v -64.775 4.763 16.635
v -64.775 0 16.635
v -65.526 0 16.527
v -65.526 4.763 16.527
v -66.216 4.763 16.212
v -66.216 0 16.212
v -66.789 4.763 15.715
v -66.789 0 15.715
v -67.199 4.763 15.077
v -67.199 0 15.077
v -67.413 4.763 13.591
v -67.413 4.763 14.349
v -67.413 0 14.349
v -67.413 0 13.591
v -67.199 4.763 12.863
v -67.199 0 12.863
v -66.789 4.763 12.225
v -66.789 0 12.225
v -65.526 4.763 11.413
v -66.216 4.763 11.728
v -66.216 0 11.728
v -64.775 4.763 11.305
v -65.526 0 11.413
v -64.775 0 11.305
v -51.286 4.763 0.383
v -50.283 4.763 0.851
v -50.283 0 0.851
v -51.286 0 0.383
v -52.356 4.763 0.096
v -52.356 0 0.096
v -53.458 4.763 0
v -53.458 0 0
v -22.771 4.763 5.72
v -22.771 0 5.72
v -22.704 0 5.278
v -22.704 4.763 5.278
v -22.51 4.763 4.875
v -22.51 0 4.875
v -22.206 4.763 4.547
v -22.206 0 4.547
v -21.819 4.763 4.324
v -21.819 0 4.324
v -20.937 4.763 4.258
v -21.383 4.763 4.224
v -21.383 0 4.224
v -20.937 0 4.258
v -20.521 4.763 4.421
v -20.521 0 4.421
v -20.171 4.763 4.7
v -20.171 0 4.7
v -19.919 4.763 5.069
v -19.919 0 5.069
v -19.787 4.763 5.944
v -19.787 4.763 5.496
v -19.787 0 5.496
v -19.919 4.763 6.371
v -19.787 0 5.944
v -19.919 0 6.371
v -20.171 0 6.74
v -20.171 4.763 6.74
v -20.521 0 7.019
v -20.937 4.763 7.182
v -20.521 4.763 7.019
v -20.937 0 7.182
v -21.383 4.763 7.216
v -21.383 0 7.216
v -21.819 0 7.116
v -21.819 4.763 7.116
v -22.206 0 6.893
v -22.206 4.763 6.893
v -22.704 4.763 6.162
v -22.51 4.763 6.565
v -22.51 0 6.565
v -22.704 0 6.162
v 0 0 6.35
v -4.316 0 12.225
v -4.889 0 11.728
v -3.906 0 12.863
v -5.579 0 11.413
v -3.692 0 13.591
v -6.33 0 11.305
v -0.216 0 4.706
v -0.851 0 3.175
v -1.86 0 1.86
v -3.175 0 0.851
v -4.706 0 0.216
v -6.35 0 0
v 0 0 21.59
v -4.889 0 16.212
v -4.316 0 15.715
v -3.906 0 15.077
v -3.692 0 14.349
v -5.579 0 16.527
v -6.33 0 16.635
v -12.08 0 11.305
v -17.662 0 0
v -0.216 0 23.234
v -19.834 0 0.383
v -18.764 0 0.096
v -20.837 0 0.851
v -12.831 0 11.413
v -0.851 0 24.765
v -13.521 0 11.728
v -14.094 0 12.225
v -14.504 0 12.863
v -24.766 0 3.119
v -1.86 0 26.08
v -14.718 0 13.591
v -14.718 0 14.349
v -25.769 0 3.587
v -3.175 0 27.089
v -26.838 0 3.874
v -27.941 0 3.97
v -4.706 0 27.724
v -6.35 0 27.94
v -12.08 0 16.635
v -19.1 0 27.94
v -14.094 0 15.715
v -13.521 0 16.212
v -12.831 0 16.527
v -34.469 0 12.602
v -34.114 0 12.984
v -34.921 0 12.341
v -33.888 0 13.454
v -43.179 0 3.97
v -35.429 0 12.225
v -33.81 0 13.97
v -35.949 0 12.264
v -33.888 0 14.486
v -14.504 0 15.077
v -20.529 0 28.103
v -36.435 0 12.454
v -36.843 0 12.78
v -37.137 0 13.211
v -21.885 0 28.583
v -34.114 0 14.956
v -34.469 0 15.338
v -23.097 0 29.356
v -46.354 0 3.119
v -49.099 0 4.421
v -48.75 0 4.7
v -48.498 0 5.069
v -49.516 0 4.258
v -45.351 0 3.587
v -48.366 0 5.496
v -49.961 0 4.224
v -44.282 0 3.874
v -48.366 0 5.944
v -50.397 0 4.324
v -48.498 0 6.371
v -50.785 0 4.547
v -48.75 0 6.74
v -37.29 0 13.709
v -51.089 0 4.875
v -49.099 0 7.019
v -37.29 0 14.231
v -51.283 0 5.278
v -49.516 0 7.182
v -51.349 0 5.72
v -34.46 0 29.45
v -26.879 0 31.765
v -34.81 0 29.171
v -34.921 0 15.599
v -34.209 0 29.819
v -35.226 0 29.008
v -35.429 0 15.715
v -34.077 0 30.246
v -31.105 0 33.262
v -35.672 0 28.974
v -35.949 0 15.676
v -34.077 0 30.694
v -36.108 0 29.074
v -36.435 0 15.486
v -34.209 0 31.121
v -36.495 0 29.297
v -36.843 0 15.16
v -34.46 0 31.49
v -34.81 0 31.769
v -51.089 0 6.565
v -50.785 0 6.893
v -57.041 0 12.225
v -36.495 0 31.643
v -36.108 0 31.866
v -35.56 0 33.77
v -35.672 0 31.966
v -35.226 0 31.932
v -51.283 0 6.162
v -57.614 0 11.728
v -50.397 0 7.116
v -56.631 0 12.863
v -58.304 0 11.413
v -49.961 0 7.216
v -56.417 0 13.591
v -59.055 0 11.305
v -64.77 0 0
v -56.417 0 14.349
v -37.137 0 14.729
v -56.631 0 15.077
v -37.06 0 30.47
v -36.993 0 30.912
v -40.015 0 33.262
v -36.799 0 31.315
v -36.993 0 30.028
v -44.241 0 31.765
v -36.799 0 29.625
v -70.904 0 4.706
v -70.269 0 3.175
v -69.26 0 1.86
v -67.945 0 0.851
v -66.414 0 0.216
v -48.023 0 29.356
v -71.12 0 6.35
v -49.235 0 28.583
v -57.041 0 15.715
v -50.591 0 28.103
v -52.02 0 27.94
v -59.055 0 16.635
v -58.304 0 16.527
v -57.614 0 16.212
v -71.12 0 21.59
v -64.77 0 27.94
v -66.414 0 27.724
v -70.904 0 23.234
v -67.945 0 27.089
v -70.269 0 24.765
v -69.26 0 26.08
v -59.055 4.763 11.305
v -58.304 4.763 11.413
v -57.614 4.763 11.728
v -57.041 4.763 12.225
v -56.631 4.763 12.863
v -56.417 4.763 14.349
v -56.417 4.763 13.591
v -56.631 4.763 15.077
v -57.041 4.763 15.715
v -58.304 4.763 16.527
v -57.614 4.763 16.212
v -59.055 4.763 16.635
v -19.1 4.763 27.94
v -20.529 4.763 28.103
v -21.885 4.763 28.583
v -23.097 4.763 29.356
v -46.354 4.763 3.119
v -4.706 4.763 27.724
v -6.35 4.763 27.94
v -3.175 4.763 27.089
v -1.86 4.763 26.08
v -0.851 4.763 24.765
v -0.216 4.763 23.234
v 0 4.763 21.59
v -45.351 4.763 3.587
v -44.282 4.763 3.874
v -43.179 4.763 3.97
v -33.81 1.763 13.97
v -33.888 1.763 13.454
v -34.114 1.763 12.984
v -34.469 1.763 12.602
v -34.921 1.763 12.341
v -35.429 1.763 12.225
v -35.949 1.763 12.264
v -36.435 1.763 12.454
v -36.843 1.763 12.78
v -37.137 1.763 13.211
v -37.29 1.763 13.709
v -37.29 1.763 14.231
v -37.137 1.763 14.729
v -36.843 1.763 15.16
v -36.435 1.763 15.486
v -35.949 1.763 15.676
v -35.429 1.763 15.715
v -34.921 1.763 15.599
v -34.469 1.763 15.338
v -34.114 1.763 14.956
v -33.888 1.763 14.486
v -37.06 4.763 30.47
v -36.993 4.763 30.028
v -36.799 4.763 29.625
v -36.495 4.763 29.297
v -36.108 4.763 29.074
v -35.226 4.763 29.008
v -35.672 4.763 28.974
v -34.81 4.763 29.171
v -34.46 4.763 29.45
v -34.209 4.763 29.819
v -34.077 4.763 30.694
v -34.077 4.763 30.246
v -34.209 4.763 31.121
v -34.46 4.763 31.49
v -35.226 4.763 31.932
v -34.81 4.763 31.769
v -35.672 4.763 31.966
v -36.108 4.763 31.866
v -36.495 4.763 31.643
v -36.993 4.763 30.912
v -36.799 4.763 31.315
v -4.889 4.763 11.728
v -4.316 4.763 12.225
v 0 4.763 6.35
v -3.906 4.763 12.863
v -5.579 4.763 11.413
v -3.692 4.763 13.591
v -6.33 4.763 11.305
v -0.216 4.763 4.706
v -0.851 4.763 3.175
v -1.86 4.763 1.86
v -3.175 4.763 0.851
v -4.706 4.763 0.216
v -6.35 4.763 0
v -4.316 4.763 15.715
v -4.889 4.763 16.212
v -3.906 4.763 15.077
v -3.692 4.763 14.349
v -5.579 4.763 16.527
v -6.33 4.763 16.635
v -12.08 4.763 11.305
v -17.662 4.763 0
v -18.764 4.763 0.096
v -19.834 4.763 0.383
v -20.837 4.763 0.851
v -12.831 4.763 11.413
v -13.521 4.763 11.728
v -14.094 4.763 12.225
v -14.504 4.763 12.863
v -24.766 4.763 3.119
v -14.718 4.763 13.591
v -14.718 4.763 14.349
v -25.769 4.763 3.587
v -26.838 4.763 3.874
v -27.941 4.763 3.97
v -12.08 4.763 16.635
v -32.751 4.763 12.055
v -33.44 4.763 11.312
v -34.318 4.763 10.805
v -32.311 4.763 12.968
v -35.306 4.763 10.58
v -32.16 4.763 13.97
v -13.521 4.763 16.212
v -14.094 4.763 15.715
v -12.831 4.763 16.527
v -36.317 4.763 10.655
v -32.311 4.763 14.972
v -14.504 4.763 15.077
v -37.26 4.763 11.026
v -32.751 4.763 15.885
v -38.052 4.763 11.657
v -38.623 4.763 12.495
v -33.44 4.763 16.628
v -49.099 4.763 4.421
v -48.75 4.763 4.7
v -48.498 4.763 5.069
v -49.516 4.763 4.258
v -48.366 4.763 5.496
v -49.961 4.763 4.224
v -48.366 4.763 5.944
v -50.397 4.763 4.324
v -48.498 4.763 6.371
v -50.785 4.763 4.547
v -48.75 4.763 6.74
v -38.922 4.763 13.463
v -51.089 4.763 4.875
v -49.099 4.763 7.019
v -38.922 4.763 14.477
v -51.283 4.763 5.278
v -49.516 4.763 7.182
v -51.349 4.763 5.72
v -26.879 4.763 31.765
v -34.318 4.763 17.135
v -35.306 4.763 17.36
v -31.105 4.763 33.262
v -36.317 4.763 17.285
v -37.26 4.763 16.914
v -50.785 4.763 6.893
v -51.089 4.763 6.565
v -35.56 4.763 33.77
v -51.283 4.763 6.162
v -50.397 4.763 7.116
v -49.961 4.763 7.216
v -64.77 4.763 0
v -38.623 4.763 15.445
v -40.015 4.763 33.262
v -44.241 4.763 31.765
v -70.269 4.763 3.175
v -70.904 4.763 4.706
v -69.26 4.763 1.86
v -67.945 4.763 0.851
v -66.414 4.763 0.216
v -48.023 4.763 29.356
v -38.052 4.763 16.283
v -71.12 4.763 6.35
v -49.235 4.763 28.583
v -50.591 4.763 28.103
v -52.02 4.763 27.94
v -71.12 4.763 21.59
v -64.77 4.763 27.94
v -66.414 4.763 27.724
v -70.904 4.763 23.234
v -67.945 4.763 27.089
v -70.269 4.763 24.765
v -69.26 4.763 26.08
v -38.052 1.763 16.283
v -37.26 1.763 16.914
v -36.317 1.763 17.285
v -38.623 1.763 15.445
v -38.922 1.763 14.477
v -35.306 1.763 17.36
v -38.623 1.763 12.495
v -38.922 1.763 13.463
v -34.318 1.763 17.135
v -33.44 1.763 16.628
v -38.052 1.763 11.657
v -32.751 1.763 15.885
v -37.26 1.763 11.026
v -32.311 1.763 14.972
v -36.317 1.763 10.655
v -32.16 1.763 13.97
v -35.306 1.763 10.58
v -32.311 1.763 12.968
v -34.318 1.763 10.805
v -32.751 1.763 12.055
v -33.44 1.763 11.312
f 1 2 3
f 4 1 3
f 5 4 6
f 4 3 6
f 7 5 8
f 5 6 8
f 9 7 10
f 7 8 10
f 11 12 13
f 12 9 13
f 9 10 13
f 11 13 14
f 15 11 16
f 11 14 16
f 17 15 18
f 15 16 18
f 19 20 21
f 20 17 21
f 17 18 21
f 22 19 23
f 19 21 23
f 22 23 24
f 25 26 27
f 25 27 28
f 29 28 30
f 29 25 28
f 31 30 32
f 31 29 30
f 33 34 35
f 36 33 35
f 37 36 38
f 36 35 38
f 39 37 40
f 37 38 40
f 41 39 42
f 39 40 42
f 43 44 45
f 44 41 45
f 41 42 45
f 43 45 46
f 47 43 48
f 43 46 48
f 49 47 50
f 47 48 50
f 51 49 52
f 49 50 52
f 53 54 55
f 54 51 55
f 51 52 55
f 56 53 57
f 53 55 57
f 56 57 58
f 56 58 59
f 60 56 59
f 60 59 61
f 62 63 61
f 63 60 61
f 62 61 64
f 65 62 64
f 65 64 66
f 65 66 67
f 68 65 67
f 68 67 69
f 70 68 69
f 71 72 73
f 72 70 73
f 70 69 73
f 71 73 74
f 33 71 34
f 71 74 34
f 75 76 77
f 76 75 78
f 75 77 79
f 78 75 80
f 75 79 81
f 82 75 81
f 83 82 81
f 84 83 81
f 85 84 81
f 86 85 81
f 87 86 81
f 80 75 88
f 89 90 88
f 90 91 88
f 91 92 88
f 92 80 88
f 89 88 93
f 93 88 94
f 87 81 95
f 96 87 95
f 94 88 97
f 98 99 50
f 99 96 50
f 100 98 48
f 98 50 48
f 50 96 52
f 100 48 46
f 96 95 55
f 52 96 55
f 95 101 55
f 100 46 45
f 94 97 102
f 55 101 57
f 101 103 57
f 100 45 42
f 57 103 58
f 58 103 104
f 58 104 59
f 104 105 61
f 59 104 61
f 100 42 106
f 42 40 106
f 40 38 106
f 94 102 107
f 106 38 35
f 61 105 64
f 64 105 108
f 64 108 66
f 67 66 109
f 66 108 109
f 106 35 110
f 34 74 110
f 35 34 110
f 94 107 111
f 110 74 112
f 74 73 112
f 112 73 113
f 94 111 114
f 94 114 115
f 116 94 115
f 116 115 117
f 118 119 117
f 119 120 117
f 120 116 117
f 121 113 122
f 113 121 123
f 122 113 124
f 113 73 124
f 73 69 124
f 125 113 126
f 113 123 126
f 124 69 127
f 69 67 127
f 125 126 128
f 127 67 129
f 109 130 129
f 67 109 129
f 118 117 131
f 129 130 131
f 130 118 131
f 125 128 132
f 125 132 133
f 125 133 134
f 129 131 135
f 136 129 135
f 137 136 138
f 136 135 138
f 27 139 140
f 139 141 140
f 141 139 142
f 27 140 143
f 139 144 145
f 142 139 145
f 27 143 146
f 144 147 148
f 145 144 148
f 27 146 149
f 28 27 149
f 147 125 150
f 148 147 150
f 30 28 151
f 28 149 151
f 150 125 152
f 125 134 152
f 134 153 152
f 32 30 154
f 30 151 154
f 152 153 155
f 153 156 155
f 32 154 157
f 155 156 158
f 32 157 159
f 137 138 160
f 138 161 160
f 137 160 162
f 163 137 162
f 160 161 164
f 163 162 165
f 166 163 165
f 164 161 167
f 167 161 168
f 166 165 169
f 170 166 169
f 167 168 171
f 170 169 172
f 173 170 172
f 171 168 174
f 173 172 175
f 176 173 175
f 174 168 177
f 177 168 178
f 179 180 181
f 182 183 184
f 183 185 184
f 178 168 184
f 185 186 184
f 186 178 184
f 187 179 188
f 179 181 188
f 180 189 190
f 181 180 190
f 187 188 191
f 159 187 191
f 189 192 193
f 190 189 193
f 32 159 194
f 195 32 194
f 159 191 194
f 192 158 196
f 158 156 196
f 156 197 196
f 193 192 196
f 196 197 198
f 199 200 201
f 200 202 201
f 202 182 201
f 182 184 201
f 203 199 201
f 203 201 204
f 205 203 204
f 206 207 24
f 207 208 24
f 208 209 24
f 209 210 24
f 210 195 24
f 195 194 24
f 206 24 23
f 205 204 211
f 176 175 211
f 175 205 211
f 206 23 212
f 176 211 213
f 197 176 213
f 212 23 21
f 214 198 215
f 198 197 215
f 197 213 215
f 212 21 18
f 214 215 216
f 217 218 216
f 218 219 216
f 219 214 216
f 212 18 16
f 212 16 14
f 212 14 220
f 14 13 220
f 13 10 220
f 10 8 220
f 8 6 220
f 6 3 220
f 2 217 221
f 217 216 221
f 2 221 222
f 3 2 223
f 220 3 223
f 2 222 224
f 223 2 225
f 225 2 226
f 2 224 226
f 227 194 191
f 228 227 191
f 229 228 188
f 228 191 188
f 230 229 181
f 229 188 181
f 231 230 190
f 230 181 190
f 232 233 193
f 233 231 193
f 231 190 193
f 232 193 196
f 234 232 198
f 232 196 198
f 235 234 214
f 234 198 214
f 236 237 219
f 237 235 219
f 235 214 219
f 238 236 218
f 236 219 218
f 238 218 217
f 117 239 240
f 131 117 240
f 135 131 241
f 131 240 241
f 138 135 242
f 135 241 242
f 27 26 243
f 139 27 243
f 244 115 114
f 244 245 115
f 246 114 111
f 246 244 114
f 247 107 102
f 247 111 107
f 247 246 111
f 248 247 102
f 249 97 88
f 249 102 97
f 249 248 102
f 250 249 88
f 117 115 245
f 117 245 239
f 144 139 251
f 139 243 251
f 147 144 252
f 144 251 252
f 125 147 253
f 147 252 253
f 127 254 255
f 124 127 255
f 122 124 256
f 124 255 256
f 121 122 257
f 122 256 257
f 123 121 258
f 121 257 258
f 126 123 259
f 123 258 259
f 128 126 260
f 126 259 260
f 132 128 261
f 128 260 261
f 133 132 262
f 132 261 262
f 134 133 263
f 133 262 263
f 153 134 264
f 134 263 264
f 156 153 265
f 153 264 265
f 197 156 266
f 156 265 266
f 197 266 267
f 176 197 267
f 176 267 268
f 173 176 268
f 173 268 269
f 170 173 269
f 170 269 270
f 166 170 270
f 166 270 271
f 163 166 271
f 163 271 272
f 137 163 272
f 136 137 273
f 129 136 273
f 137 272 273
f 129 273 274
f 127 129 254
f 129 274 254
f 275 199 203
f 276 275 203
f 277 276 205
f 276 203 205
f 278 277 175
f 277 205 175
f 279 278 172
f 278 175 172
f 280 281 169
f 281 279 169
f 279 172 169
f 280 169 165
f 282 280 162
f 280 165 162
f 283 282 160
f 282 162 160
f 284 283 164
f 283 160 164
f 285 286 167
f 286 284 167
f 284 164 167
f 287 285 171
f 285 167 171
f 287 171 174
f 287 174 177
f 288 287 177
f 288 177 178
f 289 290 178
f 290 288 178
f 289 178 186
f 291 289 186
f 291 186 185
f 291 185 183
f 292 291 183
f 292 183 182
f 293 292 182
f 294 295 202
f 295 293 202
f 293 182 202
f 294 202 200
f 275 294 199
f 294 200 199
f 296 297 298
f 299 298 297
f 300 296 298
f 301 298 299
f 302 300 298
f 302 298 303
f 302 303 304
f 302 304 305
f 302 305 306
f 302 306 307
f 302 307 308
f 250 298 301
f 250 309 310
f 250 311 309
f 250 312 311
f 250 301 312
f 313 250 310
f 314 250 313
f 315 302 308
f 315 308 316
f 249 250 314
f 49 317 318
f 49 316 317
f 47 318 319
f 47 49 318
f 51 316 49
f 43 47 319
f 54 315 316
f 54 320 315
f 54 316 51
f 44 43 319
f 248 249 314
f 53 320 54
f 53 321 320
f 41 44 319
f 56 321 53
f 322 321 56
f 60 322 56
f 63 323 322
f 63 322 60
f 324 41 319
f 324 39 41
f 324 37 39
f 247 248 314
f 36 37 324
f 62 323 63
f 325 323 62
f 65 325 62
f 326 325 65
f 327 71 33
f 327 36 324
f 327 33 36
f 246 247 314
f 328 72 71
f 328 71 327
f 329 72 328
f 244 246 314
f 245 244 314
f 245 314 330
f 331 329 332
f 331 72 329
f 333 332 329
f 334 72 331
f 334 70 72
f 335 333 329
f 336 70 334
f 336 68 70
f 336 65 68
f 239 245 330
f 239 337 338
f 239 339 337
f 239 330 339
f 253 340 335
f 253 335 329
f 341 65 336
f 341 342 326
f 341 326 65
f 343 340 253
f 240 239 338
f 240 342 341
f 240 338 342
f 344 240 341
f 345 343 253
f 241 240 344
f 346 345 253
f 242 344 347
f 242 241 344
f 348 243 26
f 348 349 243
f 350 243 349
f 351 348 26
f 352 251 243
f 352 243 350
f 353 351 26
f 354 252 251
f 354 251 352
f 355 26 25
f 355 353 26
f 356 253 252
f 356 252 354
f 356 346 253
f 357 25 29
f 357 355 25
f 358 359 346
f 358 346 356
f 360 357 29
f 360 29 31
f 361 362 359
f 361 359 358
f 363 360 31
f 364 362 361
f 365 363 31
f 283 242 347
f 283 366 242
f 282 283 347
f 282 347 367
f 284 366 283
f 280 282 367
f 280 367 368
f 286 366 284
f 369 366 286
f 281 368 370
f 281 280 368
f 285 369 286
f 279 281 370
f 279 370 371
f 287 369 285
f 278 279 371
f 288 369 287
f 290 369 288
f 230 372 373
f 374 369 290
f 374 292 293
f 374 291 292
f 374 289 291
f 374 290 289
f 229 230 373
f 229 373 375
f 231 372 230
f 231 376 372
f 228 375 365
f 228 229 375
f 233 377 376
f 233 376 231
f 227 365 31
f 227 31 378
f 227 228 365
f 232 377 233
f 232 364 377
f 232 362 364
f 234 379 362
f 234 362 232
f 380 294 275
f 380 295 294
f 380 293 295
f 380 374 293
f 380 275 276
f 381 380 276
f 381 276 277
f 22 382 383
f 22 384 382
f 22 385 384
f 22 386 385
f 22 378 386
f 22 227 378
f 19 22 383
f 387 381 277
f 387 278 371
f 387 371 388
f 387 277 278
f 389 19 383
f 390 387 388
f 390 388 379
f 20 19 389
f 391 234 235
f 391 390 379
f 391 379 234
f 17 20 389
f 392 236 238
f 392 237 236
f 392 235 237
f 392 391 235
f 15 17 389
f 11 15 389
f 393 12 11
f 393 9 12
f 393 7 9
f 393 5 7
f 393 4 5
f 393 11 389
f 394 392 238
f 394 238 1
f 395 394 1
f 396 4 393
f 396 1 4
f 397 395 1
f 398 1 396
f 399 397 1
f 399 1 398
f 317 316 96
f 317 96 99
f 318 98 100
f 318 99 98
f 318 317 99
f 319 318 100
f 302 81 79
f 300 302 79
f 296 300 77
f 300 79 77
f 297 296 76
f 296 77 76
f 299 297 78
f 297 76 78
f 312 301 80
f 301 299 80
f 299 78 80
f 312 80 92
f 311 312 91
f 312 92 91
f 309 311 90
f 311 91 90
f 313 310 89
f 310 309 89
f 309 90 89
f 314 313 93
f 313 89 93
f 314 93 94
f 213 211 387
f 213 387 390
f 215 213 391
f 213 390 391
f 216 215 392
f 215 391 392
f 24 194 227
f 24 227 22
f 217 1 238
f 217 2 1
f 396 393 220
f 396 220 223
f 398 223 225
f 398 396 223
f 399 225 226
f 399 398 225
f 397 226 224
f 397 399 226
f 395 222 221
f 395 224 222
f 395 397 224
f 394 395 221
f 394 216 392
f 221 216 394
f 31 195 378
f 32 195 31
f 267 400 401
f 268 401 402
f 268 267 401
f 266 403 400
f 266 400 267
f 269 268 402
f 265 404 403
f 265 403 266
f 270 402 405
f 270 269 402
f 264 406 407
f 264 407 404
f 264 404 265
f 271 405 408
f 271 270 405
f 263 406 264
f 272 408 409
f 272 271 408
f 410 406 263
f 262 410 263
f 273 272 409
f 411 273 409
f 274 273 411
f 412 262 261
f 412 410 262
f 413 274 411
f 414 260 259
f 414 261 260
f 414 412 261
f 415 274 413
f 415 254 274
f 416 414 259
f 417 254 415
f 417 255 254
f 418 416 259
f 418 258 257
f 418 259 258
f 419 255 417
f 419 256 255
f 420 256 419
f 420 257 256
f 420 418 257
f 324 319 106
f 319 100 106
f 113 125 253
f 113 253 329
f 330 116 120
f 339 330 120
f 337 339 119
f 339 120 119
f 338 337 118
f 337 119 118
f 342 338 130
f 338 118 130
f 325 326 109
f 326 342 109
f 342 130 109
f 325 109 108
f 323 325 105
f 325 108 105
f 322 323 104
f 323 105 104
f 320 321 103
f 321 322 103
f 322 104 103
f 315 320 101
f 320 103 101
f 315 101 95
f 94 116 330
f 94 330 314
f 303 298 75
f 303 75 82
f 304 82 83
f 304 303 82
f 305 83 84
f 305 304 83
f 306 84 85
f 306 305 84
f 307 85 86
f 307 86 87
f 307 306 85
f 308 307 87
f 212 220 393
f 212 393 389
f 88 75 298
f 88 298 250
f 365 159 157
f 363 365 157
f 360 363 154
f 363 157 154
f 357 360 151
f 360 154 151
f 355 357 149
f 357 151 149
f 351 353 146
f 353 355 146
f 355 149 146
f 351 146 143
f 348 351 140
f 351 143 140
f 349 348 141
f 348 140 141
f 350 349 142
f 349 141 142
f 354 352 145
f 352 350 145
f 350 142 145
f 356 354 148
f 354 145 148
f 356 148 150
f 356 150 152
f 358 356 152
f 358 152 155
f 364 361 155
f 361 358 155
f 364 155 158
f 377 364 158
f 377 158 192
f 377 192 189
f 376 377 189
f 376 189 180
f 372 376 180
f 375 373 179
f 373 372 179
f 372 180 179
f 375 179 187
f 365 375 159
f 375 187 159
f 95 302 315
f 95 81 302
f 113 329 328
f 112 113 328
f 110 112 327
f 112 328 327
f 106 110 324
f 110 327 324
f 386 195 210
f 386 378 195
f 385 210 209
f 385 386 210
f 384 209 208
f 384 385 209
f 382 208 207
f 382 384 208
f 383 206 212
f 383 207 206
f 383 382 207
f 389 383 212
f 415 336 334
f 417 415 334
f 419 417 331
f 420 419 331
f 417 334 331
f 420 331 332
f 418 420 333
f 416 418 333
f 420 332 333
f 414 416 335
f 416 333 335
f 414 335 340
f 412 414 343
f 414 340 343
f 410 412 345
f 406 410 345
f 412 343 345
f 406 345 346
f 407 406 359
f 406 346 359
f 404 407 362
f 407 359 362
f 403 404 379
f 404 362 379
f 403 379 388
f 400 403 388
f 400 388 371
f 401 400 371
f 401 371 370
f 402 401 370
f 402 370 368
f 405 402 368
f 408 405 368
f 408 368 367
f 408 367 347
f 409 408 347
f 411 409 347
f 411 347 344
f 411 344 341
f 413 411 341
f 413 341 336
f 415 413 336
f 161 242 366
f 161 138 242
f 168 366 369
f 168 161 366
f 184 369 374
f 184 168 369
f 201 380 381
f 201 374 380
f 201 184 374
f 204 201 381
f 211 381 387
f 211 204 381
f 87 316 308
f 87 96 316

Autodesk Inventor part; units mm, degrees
ref_plane "YZ Plane" through (0, 0, 0) normal (1, 0, 0) x (0, 1, 0)
ref_plane "XZ Plane" through (0, 0, 0) normal (0, 1, 0) x (-1, 0, 0)
ref_plane "XY Plane" through (0, 0, 0) normal (0, 0, 1) x (1, 0, 0)
sketch "Sketch1" plane through (0, 0, 0) normal (0, 1, 0) x (-1, 0, 0)
  line L0 (0, 0) -> (0, 27.94)
  line L1 (71.12, 27.94) -> (71.12, 0)
  arc A0 (49.5914, 27.94) -> (21.5286, 27.94) centre (35.56, 13.97) ccw
  line L2 (0, 27.94) -> (21.5286, 27.94)
  line L3 (49.5914, 27.94) -> (71.12, 27.94)
  circle A1 centre (35.56, 13.97) radius 16.5 construction
  circle A2 centre (35.56, 30.47) radius 1.5
  line L4 (35.56, 13.97) -> (49.8494, 5.72) construction
  line L5 (35.56, 13.97) -> (21.2706, 5.72) construction
  circle A3 centre (21.2706, 5.72) radius 1.5
  circle A4 centre (49.8494, 5.72) radius 1.5
  line L6 (71.12, 13.97) -> (0, 13.97) construction
  line L7 (51.7567, 0) -> (44.8805, 3.97)
  line L8 (19.3633, 0) -> (26.2395, 3.97)
  line L9 (44.8805, 3.97) -> (26.2395, 3.97)
  line L10 (59.055, 13.97) -> (64.775, 13.97) construction
  line L11 (59.055, 11.305) -> (64.775, 11.305)
  line L12 (64.775, 16.635) -> (59.055, 16.635)
  arc A5 (59.055, 16.635) -> (59.055, 11.305) centre (59.055, 13.97) ccw
  arc A6 (64.775, 11.305) -> (64.775, 16.635) centre (64.775, 13.97) ccw
  line L13 (6.33, 13.97) -> (12.08, 13.97) construction
  line L14 (6.33, 11.305) -> (12.08, 11.305)
  line L15 (12.08, 16.635) -> (6.33, 16.635)
  arc A7 (6.33, 16.635) -> (6.33, 11.305) centre (6.33, 13.97) ccw
  arc A8 (12.08, 11.305) -> (12.08, 16.635) centre (12.08, 13.97) ccw
  line L16 (71.12, 0) -> (51.7567, 0)
  line L17 (19.3633, 0) -> (0, 0)
  point P0 (61.915, 13.97)
  point P1 (9.205, 13.97)
  dimension "d0" = 27.94
  dimension "d1" = 71.12
  dimension "d5" = 35.56
  dimension "d7" = 19.8
  dimension "d8" = 33
  dimension "d9" = 3
  dimension "d10" = 3
  dimension "d11" = 3
  dimension "d13" = 30
  dimension "d14" = 4
  dimension "d15" = 4
  dimension "d16" = 10
  dimension "d17" = 2.86
  dimension "d18" = 5.33
  dimension "d19" = 2.875
  dimension "d20" = 5.33
  dimension "d21" = 26.355
  dimension "d22" = 26.355
  dimension "d23" = 13.97
extrude "Extrusion1" add sketch "Sketch1" along normal blind 4.763
fillet "Fillet1" radius 6.35 10 edges at (0, 2.3815, 0) (0, 2.3815, 27.94) (-71.12, 2.3815, 0) (-71.12, 2.3815, 27.94) (-21.5286, 2.3815, 27.94) (-49.5914, 2.3815, 27.94) (-26.2395, 2.3815, 3.97) (-19.3633, 2.3815, 0) (-44.8805, 2.3815, 3.97) (-51.7567, 2.3815, 0)
sketch "Sketch2" plane through (0, 4.763, 0) normal (0, 1, 0) x (1, 0, 0)
  arc A0 (-48.0228, -29.3557) -> (-23.0972, -29.3557) centre (-35.56, -13.97) ccw projected
  circle A1 centre (-35.56, -13.97) radius 3.4
  point P0 (0, 0)
  dimension "d27" = 6.8
extrude "Extrusion2" cut sketch "Sketch2" against normal blind 3
sketch "Sketch3" plane through (-35.56, 1.763, 13.97) normal (0, 1, 0) x (1, 0, 0)
  circle A0 centre (0, 0) radius 3.4 projected
  circle A1 centre (0, 0) radius 1.75
  point P0 (35.56, 13.97)
  dimension "d30" = 3.5
extrude "Extrusion3" cut sketch "Sketch3" against normal blind 6.75 contours A1
properties part number "MountPlate"
